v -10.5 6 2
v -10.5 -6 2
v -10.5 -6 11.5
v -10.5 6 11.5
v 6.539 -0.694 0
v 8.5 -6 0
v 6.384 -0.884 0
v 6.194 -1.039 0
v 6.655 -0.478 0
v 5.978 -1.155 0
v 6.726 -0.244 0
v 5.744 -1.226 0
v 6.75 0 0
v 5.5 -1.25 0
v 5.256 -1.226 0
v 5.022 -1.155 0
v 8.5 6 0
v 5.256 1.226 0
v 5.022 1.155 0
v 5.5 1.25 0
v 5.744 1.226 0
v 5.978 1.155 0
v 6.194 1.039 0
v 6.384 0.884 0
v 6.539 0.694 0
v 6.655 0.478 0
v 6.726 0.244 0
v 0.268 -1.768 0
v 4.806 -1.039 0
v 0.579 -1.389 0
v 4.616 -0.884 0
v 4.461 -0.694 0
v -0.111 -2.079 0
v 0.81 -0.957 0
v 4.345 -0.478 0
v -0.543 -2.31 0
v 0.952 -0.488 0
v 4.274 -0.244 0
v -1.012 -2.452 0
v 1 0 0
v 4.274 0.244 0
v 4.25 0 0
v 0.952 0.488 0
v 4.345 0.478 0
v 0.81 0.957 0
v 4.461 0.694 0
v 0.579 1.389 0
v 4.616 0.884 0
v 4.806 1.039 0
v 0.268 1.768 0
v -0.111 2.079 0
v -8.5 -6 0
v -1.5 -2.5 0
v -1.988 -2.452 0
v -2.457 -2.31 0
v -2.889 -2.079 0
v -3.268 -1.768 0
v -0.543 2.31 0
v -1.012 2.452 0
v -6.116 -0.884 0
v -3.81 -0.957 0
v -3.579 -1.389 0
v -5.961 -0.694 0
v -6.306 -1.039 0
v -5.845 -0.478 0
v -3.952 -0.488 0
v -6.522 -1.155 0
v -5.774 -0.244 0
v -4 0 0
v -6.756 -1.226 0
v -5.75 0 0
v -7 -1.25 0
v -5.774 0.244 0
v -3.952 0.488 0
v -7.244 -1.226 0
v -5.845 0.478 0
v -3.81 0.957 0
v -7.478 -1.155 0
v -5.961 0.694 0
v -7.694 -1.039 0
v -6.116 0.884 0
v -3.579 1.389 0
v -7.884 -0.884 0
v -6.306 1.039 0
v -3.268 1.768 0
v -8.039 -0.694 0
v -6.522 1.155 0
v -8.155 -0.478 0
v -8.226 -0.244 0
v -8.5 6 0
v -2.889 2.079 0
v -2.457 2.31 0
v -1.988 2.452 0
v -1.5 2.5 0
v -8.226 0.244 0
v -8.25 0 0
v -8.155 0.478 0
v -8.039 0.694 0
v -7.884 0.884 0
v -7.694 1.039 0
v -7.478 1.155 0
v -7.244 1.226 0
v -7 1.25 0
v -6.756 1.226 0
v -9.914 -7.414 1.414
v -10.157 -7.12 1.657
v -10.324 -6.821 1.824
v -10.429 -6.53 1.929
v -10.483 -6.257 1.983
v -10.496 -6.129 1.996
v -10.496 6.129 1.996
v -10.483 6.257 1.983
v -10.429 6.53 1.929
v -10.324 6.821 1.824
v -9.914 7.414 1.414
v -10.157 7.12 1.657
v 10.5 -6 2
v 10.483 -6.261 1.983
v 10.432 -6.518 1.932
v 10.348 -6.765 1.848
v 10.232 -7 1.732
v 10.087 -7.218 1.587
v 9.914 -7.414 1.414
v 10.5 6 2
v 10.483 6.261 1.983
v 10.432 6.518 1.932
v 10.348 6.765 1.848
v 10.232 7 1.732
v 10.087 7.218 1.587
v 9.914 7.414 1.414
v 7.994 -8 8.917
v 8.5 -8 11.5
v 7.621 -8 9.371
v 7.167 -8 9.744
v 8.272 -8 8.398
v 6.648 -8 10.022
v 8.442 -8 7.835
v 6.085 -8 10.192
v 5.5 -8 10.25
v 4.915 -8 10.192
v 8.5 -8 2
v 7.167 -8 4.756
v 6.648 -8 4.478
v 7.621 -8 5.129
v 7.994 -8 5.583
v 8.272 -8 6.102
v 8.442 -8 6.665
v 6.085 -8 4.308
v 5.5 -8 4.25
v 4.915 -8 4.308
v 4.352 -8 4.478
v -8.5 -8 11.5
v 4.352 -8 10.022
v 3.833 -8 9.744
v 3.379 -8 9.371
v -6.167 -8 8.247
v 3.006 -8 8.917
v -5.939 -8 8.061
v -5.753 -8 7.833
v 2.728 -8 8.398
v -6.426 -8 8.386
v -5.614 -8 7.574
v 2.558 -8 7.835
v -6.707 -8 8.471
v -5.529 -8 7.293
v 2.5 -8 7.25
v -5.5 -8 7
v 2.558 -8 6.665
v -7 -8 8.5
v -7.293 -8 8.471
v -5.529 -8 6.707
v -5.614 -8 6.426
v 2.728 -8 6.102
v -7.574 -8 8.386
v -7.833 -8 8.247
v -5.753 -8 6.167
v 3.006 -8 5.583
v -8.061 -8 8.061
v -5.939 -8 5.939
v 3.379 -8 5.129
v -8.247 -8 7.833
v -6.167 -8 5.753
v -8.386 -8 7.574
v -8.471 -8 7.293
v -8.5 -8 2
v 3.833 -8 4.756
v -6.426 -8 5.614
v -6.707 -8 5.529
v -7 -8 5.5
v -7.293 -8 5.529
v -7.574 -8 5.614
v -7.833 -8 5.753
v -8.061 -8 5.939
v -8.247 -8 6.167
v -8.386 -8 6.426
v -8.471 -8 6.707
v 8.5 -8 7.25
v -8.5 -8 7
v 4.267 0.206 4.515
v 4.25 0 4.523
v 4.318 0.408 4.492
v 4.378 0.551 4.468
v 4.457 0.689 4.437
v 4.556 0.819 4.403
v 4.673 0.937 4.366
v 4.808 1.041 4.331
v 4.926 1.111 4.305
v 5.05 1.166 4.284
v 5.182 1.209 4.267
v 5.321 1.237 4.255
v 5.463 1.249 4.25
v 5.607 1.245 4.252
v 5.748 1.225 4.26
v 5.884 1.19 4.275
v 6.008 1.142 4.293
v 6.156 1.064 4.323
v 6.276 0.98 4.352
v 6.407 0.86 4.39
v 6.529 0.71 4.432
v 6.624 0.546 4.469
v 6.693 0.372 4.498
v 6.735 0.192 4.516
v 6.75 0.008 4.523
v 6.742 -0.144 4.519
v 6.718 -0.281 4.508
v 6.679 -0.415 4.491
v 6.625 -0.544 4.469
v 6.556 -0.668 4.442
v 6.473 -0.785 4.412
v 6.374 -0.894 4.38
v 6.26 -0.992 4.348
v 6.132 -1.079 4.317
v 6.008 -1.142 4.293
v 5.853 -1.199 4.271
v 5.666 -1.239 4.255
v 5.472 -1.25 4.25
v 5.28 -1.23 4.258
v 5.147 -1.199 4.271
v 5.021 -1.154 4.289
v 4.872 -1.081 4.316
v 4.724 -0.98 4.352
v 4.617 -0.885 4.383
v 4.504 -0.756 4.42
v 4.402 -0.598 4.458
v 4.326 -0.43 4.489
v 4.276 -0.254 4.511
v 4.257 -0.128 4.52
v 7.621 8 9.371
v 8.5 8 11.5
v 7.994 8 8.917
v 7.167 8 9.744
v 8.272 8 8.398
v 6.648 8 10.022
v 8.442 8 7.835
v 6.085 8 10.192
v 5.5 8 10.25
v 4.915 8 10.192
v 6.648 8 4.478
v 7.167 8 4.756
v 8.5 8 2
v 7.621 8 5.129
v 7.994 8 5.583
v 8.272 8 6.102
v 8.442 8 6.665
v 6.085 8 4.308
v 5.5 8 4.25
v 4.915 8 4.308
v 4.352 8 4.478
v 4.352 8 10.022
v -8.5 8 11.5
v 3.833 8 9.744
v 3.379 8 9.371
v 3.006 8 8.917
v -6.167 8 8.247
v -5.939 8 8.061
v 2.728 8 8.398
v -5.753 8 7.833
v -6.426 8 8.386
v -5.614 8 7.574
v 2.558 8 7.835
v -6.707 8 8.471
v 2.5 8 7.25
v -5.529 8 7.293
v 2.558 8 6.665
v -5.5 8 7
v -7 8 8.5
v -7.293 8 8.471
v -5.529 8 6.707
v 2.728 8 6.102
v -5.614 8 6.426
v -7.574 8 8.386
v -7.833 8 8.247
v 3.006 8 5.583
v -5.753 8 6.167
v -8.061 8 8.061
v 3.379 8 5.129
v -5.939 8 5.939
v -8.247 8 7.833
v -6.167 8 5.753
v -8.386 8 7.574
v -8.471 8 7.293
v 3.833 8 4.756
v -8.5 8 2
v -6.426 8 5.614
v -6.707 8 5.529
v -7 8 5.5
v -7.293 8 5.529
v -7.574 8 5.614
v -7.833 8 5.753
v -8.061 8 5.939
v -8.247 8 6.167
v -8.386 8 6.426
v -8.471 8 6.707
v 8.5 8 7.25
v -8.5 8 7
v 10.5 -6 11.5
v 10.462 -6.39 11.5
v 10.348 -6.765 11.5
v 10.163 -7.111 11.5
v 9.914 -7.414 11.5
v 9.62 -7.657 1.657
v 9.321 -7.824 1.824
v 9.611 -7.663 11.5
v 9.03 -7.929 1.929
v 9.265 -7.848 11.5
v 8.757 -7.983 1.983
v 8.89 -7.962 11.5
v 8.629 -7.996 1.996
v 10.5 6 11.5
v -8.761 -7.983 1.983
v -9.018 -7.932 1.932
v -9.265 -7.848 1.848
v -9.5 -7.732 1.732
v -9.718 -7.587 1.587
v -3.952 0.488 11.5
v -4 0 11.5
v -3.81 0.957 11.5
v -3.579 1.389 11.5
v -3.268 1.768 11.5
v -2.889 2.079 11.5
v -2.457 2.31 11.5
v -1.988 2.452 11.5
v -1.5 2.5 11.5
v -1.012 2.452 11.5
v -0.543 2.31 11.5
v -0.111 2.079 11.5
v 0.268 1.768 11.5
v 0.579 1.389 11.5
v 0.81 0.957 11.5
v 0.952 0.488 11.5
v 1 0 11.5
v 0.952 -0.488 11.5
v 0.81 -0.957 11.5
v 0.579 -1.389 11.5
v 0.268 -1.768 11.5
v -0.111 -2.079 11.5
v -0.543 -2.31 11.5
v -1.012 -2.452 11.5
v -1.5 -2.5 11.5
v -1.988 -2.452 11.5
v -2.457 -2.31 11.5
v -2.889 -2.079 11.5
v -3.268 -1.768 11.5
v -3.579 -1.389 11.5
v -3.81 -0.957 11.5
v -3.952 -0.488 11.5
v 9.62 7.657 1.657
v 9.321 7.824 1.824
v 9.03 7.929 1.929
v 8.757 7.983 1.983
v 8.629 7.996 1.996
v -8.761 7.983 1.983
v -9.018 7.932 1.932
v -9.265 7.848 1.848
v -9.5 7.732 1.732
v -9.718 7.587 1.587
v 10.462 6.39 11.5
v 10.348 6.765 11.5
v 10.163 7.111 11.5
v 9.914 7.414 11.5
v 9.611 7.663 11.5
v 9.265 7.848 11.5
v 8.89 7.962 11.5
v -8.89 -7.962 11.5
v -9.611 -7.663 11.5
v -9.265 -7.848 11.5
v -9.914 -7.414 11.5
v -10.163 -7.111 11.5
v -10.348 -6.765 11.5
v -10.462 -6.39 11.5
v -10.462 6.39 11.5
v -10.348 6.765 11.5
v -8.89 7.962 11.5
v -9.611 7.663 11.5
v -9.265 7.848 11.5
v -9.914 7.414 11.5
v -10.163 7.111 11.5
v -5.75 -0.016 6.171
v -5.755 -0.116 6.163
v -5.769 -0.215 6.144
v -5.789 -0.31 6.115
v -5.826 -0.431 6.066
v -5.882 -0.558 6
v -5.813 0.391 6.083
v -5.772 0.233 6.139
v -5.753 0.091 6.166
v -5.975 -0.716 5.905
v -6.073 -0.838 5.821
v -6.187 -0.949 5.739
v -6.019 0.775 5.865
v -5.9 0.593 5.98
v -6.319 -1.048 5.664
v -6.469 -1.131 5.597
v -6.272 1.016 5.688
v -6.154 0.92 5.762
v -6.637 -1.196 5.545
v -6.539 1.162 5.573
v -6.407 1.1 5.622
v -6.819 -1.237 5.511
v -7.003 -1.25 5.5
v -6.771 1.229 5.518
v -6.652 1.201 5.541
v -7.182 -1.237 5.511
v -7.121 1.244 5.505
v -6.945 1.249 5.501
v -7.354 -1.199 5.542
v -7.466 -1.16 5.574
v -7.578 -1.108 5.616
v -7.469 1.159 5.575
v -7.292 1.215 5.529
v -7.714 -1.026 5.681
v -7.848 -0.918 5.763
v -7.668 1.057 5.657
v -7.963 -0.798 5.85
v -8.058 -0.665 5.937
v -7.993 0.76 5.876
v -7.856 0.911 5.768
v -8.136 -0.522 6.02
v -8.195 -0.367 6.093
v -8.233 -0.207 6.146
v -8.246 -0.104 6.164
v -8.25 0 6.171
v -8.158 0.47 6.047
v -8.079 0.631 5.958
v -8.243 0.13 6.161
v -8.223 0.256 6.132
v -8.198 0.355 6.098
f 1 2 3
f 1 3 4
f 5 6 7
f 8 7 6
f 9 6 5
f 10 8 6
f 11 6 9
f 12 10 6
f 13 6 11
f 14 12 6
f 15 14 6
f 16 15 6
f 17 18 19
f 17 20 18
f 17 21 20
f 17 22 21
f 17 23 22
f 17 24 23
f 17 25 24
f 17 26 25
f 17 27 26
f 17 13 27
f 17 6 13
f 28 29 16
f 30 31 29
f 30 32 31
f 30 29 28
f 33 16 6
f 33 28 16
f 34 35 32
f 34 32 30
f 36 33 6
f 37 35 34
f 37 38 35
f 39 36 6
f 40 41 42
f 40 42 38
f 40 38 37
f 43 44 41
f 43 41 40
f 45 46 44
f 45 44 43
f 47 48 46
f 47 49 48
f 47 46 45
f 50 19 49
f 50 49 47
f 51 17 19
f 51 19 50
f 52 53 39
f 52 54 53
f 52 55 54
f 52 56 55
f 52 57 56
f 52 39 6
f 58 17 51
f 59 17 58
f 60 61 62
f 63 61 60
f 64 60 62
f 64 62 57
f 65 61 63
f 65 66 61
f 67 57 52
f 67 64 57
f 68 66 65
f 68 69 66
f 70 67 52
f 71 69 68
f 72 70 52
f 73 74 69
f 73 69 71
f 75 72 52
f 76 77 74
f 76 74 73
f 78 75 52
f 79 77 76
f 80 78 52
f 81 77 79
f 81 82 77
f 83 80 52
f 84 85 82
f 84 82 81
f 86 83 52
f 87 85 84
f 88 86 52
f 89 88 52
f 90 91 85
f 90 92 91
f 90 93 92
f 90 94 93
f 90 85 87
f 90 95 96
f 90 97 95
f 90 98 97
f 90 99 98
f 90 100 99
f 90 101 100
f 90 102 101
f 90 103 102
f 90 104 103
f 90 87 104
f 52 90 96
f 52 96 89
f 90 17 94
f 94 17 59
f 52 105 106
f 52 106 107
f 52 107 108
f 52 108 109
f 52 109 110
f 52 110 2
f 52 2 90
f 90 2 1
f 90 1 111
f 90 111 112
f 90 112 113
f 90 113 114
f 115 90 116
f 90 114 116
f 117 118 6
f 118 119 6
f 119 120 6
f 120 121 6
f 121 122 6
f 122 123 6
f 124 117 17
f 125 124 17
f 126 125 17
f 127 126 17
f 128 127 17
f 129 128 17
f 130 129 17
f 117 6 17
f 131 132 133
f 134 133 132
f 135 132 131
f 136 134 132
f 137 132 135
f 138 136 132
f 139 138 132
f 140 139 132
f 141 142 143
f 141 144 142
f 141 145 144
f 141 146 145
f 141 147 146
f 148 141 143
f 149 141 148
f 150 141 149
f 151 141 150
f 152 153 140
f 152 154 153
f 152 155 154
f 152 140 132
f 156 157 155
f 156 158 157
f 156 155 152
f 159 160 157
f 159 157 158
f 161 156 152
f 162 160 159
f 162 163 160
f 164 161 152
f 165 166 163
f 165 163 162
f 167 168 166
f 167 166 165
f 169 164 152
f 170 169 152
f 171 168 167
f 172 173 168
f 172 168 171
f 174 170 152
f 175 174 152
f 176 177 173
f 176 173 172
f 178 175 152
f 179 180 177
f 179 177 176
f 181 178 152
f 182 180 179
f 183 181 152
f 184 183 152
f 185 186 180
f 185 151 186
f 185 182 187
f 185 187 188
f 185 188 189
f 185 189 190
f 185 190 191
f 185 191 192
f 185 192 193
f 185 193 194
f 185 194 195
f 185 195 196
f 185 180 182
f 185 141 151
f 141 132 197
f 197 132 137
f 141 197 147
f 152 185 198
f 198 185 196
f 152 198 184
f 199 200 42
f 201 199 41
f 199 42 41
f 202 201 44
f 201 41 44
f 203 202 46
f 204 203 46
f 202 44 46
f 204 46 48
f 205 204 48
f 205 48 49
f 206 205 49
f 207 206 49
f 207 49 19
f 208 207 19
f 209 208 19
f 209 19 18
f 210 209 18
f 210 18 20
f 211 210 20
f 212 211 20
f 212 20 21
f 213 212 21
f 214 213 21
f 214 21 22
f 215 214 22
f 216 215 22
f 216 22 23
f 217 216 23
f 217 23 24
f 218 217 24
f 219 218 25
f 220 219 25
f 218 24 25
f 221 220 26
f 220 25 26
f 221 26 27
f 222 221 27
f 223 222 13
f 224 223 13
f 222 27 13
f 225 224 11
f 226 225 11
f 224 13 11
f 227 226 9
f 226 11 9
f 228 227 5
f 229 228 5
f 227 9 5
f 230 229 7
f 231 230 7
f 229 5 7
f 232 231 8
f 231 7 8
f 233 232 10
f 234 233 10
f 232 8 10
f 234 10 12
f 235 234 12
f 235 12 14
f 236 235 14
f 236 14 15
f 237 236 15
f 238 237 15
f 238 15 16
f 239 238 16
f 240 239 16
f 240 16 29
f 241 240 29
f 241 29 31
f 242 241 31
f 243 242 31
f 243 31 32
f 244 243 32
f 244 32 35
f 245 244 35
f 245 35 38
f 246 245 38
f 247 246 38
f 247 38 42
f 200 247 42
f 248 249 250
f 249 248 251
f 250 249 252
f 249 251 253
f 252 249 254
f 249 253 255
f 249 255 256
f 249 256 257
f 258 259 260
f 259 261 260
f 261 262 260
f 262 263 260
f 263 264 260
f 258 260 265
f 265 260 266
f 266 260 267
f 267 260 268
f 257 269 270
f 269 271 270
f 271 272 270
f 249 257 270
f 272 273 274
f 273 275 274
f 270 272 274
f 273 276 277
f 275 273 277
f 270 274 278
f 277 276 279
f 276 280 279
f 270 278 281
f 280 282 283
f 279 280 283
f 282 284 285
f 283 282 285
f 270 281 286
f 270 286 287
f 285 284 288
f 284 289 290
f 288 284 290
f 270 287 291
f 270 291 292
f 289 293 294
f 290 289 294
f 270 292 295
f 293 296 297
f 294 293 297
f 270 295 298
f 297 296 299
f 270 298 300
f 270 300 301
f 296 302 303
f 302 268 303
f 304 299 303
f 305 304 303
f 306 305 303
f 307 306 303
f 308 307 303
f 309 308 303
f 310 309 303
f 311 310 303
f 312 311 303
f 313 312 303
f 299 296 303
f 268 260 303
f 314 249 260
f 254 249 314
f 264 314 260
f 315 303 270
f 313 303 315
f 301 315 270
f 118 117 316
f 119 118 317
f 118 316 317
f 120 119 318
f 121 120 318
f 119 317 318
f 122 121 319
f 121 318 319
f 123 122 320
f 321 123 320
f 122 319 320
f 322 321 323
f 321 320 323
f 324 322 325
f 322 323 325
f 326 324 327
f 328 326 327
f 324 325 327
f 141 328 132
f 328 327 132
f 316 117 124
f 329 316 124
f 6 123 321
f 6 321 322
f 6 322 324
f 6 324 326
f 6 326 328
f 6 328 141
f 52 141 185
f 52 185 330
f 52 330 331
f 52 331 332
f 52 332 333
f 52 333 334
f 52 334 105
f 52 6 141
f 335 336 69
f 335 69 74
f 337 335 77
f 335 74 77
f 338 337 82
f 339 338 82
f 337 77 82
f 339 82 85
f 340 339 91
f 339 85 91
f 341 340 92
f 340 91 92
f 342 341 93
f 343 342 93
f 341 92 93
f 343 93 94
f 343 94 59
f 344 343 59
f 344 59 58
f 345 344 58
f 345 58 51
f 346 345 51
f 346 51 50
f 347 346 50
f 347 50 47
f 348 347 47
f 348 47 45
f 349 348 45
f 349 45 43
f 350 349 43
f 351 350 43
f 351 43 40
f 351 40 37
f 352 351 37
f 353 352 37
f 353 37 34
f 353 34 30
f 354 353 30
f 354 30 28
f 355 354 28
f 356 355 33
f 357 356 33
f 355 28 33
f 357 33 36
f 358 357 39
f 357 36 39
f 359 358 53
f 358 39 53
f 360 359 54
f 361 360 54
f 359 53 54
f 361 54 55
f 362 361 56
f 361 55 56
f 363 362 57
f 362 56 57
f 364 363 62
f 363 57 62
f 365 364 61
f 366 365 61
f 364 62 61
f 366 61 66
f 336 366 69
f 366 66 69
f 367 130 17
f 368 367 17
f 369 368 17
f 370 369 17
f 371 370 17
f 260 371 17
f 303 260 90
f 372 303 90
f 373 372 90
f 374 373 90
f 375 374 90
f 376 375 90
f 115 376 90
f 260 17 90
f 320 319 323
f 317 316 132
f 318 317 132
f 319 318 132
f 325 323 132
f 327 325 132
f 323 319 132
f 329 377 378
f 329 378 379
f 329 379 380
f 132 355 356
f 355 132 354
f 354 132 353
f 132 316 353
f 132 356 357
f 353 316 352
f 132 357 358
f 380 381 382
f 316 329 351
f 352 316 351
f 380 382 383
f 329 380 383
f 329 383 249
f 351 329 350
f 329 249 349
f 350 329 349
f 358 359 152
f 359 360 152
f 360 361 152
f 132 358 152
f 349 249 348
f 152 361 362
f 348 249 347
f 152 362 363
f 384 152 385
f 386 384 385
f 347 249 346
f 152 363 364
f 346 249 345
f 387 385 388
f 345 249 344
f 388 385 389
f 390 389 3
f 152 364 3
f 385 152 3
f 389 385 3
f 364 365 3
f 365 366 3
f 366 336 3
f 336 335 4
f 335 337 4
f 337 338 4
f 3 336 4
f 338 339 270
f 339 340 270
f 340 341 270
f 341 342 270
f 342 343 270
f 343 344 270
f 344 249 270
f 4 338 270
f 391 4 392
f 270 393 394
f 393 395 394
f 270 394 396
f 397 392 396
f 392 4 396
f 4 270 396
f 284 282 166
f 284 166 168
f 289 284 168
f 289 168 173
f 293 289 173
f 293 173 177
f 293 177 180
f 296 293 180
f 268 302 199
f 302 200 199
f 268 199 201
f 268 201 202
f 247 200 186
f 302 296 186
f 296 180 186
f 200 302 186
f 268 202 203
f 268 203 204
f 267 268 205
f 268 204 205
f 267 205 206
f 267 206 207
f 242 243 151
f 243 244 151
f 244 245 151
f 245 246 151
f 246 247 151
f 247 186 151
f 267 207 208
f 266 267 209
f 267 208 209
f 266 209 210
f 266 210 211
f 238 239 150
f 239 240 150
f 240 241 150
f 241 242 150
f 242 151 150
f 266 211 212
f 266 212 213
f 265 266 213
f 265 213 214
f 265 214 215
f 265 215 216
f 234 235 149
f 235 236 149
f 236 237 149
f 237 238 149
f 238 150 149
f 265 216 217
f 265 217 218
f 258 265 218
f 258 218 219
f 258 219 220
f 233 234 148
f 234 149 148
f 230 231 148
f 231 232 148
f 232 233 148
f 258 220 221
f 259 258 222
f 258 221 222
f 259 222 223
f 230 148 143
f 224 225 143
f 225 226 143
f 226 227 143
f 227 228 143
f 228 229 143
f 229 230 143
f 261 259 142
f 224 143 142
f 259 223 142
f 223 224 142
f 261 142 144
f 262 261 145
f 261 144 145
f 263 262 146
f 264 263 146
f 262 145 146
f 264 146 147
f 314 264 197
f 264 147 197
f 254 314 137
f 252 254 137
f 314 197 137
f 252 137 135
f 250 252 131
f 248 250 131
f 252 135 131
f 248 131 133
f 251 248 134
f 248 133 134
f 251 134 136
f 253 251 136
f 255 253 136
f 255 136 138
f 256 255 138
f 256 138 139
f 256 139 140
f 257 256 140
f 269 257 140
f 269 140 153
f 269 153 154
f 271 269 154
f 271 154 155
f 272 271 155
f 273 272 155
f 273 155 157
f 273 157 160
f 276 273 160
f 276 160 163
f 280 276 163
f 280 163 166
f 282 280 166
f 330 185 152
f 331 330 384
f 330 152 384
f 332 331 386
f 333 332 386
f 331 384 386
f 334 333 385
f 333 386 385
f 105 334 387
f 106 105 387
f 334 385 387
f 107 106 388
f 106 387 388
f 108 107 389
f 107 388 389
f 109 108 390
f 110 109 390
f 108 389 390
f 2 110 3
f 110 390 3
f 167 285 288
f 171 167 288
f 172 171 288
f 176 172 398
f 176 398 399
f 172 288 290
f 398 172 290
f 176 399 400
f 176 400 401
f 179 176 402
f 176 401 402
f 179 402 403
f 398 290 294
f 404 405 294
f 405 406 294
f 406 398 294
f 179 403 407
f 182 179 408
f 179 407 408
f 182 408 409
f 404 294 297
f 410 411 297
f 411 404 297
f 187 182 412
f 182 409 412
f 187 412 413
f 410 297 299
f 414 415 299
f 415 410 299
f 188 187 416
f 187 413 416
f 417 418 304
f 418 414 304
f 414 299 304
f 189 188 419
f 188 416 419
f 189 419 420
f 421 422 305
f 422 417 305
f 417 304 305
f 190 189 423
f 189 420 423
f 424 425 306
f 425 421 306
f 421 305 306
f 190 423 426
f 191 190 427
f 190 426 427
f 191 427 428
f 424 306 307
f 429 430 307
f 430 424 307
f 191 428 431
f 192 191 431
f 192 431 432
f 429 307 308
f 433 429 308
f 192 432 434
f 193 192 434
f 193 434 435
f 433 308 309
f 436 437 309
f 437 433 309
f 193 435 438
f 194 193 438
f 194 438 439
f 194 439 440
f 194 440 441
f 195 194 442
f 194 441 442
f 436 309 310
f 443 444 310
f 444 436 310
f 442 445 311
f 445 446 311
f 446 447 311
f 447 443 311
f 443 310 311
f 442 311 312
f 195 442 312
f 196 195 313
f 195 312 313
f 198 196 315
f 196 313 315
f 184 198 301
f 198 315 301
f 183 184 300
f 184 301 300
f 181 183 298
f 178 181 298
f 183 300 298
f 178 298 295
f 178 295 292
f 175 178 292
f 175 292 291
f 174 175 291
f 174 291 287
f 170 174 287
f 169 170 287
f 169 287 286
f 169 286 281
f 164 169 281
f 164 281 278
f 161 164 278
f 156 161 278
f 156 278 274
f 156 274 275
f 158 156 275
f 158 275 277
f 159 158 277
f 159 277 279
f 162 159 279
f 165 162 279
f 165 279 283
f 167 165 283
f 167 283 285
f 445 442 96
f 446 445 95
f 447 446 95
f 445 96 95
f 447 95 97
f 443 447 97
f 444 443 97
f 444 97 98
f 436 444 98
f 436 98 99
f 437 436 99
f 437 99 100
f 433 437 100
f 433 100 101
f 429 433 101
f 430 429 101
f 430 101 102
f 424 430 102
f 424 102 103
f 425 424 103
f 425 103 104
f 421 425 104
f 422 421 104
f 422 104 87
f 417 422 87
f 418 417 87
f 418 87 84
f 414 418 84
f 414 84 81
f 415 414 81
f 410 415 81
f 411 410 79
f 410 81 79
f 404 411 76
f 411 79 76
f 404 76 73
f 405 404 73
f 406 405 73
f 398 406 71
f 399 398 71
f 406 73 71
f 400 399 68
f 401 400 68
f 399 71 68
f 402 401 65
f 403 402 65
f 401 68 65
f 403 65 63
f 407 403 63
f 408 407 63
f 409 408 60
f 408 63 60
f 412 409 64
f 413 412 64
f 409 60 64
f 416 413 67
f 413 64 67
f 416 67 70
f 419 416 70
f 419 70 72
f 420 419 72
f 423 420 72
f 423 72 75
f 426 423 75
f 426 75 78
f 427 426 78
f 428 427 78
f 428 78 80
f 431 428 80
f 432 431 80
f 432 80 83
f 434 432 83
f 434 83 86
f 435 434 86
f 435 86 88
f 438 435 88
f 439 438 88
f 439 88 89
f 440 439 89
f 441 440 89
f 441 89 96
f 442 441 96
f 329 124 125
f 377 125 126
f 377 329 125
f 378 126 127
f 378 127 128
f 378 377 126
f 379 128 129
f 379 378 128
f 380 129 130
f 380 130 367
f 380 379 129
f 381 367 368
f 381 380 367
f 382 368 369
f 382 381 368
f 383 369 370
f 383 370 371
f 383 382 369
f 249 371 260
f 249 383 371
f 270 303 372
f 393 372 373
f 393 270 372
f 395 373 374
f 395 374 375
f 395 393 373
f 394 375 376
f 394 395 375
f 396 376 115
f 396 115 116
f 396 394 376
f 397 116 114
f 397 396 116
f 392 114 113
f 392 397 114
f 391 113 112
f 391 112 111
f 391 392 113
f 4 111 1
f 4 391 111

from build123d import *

# Parameters (mm, degrees)
SKETCH1_W                  = 21
SKETCH1_H                  = 16
BOSS_EXTRUDE1_DEPTH        = 11.5
F_10_CLEARANCE_HOLE1_D     = 5
F_12_CLEARANCE_HOLE1_D     = 6
F_2_CLEARANCE_HOLE1_REACH  = 19.507
F_2_CLEARANCE_HOLE1_BORE_R = 1.25
F_3_CLEARANCE_HOLE2_D      = 3
F_2_CLEARANCE_HOLE2_REACH  = 19.507
F_2_CLEARANCE_HOLE2_BORE_R = 1.25
CHAMFER2_SIZE              = 2
FILLET1_R                  = 2


with BuildPart() as part:
    # Sketch1 → Boss-Extrude1 (new body)
    with BuildSketch(Plane(origin=(0, 0, 0), x_dir=(-1, 0, 0), z_dir=(0, 0, -1))):
        Rectangle(SKETCH1_W, SKETCH1_H)
    extrude(amount=-BOSS_EXTRUDE1_DEPTH)

    # #10 Clearance Hole1 (through all)
    with Locations(Plane.XY.offset(11.5)):
        with Locations((-1.5, 0)):
            Hole(F_10_CLEARANCE_HOLE1_D / 2)

    # #12 Clearance Hole1 (through all)
    with Locations(Plane(origin=(0, 8, 0), x_dir=(1, 0, 0), z_dir=(0, 1, 0))):
        with Locations((5.5, -7.25)):
            Hole(F_12_CLEARANCE_HOLE1_D / 2)

    # #2 Clearance Hole1 bore → #2 Clearance Hole1 (cut, up to next)
    with BuildSketch(Plane(origin=(0, 0, 0), x_dir=(-1, 0, 0), z_dir=(0, 0, -1)), mode=Mode.PRIVATE) as f_2_clearance_hole1_sk1:
        with Locations((-5.5, 0)):
            Circle(F_2_CLEARANCE_HOLE1_BORE_R)
    f_2_clearance_hole1_tool1 = extrude(f_2_clearance_hole1_sk1.sketch, amount=-F_2_CLEARANCE_HOLE1_REACH, mode=Mode.PRIVATE) & part.part
    add(f_2_clearance_hole1_tool1.solids().sort_by_distance((5.5, 0, 0))[0], mode=Mode.SUBTRACT)

    # #3 Clearance Hole2 (through all)
    with Locations(Plane(origin=(0, -8, 0), x_dir=(-1, 0, 0), z_dir=(0, -1, 0))):
        with Locations((7, -7)):
            Hole(F_3_CLEARANCE_HOLE2_D / 2)

    # #2 Clearance Hole2 bore → #2 Clearance Hole2 (cut, up to next)
    with BuildSketch(Plane(origin=(0, 0, 0), x_dir=(-1, 0, 0), z_dir=(0, 0, -1)), mode=Mode.PRIVATE) as f_2_clearance_hole2_sk1:
        with Locations((7, 0)):
            Circle(F_2_CLEARANCE_HOLE2_BORE_R)
    f_2_clearance_hole2_tool1 = extrude(f_2_clearance_hole2_sk1.sketch, amount=-F_2_CLEARANCE_HOLE2_REACH, mode=Mode.PRIVATE) & part.part
    add(f_2_clearance_hole2_tool1.solids().sort_by_distance((-7, 0, 0))[0], mode=Mode.SUBTRACT)

    # Chamfer2
    chamfer2_edges = [part.edges().sort_by_distance(p)[0] for p in [
        (0, -8, 0),
        (10.5, 0, 0),
        (0, 8, 0),
        (-10.5, 0, 0),
    ]]
    chamfer(chamfer2_edges, length=CHAMFER2_SIZE)

    # Fillet1
    fillet1_edges = [part.edges().sort_by_distance(p)[0] for p in [
        (-10.5, -8, 6.75),
        (10.5, -8, 6.75),
        (10.5, 8, 6.75),
        (-10.5, 8, 6.75),
    ]]
    fillet(fillet1_edges, radius=FILLET1_R - 0.0001)  # a hair under: the kernel refuses the full size


solid = part.part
